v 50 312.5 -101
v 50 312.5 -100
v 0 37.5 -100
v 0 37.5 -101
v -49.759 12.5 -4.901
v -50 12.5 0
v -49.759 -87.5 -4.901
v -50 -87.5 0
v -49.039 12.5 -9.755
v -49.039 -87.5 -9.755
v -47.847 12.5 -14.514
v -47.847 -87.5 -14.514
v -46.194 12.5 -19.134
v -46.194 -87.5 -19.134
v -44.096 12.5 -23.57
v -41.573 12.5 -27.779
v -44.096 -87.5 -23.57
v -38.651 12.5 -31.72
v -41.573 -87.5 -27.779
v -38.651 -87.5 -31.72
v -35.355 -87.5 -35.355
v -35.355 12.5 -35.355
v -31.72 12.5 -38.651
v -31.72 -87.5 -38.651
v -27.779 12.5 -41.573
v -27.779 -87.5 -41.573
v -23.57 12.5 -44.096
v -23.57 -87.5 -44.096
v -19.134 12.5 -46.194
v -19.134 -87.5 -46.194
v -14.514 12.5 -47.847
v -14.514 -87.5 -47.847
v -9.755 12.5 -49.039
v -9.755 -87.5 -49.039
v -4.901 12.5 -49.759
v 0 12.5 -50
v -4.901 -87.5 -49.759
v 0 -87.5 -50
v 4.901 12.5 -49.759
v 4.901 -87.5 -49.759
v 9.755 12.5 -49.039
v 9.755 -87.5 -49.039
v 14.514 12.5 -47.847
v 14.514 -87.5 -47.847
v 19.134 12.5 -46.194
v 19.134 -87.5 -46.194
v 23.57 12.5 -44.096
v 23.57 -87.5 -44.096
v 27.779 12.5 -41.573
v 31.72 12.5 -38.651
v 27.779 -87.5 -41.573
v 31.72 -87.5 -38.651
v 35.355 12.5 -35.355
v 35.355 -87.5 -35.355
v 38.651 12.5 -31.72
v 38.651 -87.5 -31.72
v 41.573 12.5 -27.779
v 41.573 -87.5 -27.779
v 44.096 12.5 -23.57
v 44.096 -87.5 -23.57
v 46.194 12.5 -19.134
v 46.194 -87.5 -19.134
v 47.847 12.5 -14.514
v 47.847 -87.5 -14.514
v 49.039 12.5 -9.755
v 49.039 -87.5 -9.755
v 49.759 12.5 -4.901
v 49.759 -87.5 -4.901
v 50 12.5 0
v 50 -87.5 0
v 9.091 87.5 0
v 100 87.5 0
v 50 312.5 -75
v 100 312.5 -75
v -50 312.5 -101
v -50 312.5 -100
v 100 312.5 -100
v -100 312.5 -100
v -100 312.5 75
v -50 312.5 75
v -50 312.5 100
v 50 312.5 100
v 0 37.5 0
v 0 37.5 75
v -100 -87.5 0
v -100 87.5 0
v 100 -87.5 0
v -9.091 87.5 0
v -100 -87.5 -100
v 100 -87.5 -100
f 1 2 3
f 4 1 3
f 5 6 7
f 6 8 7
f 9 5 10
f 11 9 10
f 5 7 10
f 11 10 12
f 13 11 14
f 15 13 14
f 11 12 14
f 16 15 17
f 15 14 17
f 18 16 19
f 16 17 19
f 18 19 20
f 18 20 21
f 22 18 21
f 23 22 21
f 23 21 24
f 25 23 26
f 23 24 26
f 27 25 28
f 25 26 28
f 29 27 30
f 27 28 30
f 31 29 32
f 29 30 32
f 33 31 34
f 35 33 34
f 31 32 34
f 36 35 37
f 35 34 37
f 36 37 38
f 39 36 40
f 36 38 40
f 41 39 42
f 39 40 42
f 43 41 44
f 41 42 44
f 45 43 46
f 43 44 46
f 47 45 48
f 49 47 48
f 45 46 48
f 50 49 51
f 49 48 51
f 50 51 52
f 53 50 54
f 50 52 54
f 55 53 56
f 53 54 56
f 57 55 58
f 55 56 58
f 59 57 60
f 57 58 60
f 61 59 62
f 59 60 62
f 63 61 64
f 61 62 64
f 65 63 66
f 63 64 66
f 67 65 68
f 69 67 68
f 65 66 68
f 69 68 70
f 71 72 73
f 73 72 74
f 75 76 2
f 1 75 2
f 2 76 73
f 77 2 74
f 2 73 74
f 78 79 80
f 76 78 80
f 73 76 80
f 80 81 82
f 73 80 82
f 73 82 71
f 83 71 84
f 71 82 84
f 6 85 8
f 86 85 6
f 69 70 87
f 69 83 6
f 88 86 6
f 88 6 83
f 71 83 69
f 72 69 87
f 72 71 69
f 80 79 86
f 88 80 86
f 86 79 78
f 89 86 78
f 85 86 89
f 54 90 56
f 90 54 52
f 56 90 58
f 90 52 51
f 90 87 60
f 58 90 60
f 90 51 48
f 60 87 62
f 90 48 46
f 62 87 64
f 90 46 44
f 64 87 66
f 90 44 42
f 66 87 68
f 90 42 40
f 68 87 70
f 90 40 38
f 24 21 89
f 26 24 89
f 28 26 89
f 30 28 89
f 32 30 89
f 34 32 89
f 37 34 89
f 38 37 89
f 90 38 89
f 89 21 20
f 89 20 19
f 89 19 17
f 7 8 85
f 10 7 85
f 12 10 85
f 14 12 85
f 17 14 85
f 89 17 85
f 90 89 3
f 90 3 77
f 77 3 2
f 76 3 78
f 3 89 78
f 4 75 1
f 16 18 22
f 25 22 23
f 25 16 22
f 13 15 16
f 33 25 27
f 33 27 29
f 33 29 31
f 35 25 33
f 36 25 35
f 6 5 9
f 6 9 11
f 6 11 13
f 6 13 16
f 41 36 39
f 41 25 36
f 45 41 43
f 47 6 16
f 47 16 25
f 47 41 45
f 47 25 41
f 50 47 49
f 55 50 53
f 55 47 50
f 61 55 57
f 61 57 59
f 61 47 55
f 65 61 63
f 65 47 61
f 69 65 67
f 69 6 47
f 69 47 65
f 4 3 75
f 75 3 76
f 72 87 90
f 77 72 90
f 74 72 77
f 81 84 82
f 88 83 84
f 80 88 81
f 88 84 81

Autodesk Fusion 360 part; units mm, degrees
sketch "草图1" plane through (0, 0, 0) normal (0, 0, 1) x (1, 0, 0)
  line L0 (-100, 87.5) -> (100, 87.5)
  line L1 (100, 87.5) -> (100, -87.5)
  line L2 (100, -87.5) -> (-100, -87.5)
  line L3 (-100, -87.5) -> (-100, 87.5)
  line L4 (-100, 0) -> (100, 0) construction
  line L5 (0, 75) -> (0, -50) construction
  dimension "d1" = 200
  dimension "d2" = 175
extrude "拉伸1" add sketch "草图1" against normal blind 100
sketch "草图2" plane through (0, -87.5, 0) normal (0, -1, 0) x (1, 0, 0)
  line L0 (100, 0) -> (-100, 0)
  line L1 (-100, 0) -> (-100, -100)
  line L2 (-100, -100) -> (100, -100)
  line L3 (100, -100) -> (100, 0)
  circle A0 centre (0, 0) radius 50
  dimension "d5" = 100
extrude "拉伸2" cut sketch "草图2" against normal blind 100 contours L0 A0 picked at (10.3915, -13.0305)
sketch "草图3" plane through (100, 0, 0) normal (1, 0, 0) x (0, 1, 0)
  line L0 (87.5, 0) -> (-87.5, 0)
  line L1 (-87.5, 0) -> (-87.5, -100)
  line L2 (-87.5, -100) -> (87.5, -100)
  line L3 (87.5, -100) -> (87.5, 0)
  line L4 (87.5, 0) -> (312.5, -75)
  line L5 (312.5, -75) -> (312.5, -100)
  line L6 (312.5, -100) -> (87.5, -100)
  line L7 (-150, 0) -> (245.1978, 0) construction
  dimension "d8" = 25
  dimension "d9" = 225
extrude "拉伸3" add sketch "草图3" against normal blind 100 contours L3 L4 L5 L6
sketch "草图4" plane through (-100, 0, 0) normal (-1, 0, 0) x (0, -1, 0)
  line L0 (87.5, 0) -> (-87.5, 0)
  line L1 (-87.5, 0) -> (-87.5, -100)
  line L2 (-87.5, -100) -> (87.5, -100)
  line L3 (87.5, -100) -> (87.5, 0)
  line L4 (-312.5, 75) -> (-87.5, 0)
  line L5 (-87.5, -100) -> (-312.5, -100)
  line L6 (-312.5, -100) -> (-312.5, 75)
  dimension "d12" = 175
  dimension "d13" = 225
extrude "拉伸4" add sketch "草图4" against normal blind 100 contours L1 L4 L5 L6
ref_plane "工作平面1" through (0, 0, 100) normal (0, 0, 1) x (1, 0, 0)
sketch "草图5" plane through (0, 0, 100) normal (0, 0, 1) x (1, 0, 0)
  line L0 (-50, 312.5) -> (50, 312.5)
  line L1 (50, 312.5) -> (0, 37.5)
  line L2 (0, 37.5) -> (-50, 312.5)
  line L3 (0, -125) -> (0, 391.0284) construction
  point P0 (100, -87.5)
  point P1 (-100, -87.5)
  point P2 (-100, 87.5)
  point P3 (100, 87.5)
  point P4 (-100, 312.5)
  point P5 (100, 312.5)
  dimension "d17" = 275
  dimension "d18" = 100
extrude "拉伸5" add sketch "草图5" against normal through all
sketch "草图6" plane through (100, 0, 0) normal (1, 0, 0) x (0, 1, 0)
  line L0 (87.5, 0) -> (-87.5, 0)
  line L1 (-87.5, 0) -> (-87.5, -100)
  line L2 (-87.5, -100) -> (312.5, -100)
  line L3 (312.5, -100) -> (312.5, -75)
  line L4 (312.5, -75) -> (87.5, 0)
  line L5 (37.5, 100) -> (37.5, 93.4578)
  line L6 (37.5, 93.4578) -> (37.5, 75)
  line L7 (37.5, 75) -> (312.5, 100)
  line L8 (312.5, 100) -> (37.5, 100)
  point P0 (37.5, 100)
  point P1 (312.5, 100)
  dimension "d20" = 25
extrude "拉伸6" cut sketch "草图6" against normal blind 375 contours L5 L6 L7 L8
equation "d2 = 400 mm - 225 mm"
